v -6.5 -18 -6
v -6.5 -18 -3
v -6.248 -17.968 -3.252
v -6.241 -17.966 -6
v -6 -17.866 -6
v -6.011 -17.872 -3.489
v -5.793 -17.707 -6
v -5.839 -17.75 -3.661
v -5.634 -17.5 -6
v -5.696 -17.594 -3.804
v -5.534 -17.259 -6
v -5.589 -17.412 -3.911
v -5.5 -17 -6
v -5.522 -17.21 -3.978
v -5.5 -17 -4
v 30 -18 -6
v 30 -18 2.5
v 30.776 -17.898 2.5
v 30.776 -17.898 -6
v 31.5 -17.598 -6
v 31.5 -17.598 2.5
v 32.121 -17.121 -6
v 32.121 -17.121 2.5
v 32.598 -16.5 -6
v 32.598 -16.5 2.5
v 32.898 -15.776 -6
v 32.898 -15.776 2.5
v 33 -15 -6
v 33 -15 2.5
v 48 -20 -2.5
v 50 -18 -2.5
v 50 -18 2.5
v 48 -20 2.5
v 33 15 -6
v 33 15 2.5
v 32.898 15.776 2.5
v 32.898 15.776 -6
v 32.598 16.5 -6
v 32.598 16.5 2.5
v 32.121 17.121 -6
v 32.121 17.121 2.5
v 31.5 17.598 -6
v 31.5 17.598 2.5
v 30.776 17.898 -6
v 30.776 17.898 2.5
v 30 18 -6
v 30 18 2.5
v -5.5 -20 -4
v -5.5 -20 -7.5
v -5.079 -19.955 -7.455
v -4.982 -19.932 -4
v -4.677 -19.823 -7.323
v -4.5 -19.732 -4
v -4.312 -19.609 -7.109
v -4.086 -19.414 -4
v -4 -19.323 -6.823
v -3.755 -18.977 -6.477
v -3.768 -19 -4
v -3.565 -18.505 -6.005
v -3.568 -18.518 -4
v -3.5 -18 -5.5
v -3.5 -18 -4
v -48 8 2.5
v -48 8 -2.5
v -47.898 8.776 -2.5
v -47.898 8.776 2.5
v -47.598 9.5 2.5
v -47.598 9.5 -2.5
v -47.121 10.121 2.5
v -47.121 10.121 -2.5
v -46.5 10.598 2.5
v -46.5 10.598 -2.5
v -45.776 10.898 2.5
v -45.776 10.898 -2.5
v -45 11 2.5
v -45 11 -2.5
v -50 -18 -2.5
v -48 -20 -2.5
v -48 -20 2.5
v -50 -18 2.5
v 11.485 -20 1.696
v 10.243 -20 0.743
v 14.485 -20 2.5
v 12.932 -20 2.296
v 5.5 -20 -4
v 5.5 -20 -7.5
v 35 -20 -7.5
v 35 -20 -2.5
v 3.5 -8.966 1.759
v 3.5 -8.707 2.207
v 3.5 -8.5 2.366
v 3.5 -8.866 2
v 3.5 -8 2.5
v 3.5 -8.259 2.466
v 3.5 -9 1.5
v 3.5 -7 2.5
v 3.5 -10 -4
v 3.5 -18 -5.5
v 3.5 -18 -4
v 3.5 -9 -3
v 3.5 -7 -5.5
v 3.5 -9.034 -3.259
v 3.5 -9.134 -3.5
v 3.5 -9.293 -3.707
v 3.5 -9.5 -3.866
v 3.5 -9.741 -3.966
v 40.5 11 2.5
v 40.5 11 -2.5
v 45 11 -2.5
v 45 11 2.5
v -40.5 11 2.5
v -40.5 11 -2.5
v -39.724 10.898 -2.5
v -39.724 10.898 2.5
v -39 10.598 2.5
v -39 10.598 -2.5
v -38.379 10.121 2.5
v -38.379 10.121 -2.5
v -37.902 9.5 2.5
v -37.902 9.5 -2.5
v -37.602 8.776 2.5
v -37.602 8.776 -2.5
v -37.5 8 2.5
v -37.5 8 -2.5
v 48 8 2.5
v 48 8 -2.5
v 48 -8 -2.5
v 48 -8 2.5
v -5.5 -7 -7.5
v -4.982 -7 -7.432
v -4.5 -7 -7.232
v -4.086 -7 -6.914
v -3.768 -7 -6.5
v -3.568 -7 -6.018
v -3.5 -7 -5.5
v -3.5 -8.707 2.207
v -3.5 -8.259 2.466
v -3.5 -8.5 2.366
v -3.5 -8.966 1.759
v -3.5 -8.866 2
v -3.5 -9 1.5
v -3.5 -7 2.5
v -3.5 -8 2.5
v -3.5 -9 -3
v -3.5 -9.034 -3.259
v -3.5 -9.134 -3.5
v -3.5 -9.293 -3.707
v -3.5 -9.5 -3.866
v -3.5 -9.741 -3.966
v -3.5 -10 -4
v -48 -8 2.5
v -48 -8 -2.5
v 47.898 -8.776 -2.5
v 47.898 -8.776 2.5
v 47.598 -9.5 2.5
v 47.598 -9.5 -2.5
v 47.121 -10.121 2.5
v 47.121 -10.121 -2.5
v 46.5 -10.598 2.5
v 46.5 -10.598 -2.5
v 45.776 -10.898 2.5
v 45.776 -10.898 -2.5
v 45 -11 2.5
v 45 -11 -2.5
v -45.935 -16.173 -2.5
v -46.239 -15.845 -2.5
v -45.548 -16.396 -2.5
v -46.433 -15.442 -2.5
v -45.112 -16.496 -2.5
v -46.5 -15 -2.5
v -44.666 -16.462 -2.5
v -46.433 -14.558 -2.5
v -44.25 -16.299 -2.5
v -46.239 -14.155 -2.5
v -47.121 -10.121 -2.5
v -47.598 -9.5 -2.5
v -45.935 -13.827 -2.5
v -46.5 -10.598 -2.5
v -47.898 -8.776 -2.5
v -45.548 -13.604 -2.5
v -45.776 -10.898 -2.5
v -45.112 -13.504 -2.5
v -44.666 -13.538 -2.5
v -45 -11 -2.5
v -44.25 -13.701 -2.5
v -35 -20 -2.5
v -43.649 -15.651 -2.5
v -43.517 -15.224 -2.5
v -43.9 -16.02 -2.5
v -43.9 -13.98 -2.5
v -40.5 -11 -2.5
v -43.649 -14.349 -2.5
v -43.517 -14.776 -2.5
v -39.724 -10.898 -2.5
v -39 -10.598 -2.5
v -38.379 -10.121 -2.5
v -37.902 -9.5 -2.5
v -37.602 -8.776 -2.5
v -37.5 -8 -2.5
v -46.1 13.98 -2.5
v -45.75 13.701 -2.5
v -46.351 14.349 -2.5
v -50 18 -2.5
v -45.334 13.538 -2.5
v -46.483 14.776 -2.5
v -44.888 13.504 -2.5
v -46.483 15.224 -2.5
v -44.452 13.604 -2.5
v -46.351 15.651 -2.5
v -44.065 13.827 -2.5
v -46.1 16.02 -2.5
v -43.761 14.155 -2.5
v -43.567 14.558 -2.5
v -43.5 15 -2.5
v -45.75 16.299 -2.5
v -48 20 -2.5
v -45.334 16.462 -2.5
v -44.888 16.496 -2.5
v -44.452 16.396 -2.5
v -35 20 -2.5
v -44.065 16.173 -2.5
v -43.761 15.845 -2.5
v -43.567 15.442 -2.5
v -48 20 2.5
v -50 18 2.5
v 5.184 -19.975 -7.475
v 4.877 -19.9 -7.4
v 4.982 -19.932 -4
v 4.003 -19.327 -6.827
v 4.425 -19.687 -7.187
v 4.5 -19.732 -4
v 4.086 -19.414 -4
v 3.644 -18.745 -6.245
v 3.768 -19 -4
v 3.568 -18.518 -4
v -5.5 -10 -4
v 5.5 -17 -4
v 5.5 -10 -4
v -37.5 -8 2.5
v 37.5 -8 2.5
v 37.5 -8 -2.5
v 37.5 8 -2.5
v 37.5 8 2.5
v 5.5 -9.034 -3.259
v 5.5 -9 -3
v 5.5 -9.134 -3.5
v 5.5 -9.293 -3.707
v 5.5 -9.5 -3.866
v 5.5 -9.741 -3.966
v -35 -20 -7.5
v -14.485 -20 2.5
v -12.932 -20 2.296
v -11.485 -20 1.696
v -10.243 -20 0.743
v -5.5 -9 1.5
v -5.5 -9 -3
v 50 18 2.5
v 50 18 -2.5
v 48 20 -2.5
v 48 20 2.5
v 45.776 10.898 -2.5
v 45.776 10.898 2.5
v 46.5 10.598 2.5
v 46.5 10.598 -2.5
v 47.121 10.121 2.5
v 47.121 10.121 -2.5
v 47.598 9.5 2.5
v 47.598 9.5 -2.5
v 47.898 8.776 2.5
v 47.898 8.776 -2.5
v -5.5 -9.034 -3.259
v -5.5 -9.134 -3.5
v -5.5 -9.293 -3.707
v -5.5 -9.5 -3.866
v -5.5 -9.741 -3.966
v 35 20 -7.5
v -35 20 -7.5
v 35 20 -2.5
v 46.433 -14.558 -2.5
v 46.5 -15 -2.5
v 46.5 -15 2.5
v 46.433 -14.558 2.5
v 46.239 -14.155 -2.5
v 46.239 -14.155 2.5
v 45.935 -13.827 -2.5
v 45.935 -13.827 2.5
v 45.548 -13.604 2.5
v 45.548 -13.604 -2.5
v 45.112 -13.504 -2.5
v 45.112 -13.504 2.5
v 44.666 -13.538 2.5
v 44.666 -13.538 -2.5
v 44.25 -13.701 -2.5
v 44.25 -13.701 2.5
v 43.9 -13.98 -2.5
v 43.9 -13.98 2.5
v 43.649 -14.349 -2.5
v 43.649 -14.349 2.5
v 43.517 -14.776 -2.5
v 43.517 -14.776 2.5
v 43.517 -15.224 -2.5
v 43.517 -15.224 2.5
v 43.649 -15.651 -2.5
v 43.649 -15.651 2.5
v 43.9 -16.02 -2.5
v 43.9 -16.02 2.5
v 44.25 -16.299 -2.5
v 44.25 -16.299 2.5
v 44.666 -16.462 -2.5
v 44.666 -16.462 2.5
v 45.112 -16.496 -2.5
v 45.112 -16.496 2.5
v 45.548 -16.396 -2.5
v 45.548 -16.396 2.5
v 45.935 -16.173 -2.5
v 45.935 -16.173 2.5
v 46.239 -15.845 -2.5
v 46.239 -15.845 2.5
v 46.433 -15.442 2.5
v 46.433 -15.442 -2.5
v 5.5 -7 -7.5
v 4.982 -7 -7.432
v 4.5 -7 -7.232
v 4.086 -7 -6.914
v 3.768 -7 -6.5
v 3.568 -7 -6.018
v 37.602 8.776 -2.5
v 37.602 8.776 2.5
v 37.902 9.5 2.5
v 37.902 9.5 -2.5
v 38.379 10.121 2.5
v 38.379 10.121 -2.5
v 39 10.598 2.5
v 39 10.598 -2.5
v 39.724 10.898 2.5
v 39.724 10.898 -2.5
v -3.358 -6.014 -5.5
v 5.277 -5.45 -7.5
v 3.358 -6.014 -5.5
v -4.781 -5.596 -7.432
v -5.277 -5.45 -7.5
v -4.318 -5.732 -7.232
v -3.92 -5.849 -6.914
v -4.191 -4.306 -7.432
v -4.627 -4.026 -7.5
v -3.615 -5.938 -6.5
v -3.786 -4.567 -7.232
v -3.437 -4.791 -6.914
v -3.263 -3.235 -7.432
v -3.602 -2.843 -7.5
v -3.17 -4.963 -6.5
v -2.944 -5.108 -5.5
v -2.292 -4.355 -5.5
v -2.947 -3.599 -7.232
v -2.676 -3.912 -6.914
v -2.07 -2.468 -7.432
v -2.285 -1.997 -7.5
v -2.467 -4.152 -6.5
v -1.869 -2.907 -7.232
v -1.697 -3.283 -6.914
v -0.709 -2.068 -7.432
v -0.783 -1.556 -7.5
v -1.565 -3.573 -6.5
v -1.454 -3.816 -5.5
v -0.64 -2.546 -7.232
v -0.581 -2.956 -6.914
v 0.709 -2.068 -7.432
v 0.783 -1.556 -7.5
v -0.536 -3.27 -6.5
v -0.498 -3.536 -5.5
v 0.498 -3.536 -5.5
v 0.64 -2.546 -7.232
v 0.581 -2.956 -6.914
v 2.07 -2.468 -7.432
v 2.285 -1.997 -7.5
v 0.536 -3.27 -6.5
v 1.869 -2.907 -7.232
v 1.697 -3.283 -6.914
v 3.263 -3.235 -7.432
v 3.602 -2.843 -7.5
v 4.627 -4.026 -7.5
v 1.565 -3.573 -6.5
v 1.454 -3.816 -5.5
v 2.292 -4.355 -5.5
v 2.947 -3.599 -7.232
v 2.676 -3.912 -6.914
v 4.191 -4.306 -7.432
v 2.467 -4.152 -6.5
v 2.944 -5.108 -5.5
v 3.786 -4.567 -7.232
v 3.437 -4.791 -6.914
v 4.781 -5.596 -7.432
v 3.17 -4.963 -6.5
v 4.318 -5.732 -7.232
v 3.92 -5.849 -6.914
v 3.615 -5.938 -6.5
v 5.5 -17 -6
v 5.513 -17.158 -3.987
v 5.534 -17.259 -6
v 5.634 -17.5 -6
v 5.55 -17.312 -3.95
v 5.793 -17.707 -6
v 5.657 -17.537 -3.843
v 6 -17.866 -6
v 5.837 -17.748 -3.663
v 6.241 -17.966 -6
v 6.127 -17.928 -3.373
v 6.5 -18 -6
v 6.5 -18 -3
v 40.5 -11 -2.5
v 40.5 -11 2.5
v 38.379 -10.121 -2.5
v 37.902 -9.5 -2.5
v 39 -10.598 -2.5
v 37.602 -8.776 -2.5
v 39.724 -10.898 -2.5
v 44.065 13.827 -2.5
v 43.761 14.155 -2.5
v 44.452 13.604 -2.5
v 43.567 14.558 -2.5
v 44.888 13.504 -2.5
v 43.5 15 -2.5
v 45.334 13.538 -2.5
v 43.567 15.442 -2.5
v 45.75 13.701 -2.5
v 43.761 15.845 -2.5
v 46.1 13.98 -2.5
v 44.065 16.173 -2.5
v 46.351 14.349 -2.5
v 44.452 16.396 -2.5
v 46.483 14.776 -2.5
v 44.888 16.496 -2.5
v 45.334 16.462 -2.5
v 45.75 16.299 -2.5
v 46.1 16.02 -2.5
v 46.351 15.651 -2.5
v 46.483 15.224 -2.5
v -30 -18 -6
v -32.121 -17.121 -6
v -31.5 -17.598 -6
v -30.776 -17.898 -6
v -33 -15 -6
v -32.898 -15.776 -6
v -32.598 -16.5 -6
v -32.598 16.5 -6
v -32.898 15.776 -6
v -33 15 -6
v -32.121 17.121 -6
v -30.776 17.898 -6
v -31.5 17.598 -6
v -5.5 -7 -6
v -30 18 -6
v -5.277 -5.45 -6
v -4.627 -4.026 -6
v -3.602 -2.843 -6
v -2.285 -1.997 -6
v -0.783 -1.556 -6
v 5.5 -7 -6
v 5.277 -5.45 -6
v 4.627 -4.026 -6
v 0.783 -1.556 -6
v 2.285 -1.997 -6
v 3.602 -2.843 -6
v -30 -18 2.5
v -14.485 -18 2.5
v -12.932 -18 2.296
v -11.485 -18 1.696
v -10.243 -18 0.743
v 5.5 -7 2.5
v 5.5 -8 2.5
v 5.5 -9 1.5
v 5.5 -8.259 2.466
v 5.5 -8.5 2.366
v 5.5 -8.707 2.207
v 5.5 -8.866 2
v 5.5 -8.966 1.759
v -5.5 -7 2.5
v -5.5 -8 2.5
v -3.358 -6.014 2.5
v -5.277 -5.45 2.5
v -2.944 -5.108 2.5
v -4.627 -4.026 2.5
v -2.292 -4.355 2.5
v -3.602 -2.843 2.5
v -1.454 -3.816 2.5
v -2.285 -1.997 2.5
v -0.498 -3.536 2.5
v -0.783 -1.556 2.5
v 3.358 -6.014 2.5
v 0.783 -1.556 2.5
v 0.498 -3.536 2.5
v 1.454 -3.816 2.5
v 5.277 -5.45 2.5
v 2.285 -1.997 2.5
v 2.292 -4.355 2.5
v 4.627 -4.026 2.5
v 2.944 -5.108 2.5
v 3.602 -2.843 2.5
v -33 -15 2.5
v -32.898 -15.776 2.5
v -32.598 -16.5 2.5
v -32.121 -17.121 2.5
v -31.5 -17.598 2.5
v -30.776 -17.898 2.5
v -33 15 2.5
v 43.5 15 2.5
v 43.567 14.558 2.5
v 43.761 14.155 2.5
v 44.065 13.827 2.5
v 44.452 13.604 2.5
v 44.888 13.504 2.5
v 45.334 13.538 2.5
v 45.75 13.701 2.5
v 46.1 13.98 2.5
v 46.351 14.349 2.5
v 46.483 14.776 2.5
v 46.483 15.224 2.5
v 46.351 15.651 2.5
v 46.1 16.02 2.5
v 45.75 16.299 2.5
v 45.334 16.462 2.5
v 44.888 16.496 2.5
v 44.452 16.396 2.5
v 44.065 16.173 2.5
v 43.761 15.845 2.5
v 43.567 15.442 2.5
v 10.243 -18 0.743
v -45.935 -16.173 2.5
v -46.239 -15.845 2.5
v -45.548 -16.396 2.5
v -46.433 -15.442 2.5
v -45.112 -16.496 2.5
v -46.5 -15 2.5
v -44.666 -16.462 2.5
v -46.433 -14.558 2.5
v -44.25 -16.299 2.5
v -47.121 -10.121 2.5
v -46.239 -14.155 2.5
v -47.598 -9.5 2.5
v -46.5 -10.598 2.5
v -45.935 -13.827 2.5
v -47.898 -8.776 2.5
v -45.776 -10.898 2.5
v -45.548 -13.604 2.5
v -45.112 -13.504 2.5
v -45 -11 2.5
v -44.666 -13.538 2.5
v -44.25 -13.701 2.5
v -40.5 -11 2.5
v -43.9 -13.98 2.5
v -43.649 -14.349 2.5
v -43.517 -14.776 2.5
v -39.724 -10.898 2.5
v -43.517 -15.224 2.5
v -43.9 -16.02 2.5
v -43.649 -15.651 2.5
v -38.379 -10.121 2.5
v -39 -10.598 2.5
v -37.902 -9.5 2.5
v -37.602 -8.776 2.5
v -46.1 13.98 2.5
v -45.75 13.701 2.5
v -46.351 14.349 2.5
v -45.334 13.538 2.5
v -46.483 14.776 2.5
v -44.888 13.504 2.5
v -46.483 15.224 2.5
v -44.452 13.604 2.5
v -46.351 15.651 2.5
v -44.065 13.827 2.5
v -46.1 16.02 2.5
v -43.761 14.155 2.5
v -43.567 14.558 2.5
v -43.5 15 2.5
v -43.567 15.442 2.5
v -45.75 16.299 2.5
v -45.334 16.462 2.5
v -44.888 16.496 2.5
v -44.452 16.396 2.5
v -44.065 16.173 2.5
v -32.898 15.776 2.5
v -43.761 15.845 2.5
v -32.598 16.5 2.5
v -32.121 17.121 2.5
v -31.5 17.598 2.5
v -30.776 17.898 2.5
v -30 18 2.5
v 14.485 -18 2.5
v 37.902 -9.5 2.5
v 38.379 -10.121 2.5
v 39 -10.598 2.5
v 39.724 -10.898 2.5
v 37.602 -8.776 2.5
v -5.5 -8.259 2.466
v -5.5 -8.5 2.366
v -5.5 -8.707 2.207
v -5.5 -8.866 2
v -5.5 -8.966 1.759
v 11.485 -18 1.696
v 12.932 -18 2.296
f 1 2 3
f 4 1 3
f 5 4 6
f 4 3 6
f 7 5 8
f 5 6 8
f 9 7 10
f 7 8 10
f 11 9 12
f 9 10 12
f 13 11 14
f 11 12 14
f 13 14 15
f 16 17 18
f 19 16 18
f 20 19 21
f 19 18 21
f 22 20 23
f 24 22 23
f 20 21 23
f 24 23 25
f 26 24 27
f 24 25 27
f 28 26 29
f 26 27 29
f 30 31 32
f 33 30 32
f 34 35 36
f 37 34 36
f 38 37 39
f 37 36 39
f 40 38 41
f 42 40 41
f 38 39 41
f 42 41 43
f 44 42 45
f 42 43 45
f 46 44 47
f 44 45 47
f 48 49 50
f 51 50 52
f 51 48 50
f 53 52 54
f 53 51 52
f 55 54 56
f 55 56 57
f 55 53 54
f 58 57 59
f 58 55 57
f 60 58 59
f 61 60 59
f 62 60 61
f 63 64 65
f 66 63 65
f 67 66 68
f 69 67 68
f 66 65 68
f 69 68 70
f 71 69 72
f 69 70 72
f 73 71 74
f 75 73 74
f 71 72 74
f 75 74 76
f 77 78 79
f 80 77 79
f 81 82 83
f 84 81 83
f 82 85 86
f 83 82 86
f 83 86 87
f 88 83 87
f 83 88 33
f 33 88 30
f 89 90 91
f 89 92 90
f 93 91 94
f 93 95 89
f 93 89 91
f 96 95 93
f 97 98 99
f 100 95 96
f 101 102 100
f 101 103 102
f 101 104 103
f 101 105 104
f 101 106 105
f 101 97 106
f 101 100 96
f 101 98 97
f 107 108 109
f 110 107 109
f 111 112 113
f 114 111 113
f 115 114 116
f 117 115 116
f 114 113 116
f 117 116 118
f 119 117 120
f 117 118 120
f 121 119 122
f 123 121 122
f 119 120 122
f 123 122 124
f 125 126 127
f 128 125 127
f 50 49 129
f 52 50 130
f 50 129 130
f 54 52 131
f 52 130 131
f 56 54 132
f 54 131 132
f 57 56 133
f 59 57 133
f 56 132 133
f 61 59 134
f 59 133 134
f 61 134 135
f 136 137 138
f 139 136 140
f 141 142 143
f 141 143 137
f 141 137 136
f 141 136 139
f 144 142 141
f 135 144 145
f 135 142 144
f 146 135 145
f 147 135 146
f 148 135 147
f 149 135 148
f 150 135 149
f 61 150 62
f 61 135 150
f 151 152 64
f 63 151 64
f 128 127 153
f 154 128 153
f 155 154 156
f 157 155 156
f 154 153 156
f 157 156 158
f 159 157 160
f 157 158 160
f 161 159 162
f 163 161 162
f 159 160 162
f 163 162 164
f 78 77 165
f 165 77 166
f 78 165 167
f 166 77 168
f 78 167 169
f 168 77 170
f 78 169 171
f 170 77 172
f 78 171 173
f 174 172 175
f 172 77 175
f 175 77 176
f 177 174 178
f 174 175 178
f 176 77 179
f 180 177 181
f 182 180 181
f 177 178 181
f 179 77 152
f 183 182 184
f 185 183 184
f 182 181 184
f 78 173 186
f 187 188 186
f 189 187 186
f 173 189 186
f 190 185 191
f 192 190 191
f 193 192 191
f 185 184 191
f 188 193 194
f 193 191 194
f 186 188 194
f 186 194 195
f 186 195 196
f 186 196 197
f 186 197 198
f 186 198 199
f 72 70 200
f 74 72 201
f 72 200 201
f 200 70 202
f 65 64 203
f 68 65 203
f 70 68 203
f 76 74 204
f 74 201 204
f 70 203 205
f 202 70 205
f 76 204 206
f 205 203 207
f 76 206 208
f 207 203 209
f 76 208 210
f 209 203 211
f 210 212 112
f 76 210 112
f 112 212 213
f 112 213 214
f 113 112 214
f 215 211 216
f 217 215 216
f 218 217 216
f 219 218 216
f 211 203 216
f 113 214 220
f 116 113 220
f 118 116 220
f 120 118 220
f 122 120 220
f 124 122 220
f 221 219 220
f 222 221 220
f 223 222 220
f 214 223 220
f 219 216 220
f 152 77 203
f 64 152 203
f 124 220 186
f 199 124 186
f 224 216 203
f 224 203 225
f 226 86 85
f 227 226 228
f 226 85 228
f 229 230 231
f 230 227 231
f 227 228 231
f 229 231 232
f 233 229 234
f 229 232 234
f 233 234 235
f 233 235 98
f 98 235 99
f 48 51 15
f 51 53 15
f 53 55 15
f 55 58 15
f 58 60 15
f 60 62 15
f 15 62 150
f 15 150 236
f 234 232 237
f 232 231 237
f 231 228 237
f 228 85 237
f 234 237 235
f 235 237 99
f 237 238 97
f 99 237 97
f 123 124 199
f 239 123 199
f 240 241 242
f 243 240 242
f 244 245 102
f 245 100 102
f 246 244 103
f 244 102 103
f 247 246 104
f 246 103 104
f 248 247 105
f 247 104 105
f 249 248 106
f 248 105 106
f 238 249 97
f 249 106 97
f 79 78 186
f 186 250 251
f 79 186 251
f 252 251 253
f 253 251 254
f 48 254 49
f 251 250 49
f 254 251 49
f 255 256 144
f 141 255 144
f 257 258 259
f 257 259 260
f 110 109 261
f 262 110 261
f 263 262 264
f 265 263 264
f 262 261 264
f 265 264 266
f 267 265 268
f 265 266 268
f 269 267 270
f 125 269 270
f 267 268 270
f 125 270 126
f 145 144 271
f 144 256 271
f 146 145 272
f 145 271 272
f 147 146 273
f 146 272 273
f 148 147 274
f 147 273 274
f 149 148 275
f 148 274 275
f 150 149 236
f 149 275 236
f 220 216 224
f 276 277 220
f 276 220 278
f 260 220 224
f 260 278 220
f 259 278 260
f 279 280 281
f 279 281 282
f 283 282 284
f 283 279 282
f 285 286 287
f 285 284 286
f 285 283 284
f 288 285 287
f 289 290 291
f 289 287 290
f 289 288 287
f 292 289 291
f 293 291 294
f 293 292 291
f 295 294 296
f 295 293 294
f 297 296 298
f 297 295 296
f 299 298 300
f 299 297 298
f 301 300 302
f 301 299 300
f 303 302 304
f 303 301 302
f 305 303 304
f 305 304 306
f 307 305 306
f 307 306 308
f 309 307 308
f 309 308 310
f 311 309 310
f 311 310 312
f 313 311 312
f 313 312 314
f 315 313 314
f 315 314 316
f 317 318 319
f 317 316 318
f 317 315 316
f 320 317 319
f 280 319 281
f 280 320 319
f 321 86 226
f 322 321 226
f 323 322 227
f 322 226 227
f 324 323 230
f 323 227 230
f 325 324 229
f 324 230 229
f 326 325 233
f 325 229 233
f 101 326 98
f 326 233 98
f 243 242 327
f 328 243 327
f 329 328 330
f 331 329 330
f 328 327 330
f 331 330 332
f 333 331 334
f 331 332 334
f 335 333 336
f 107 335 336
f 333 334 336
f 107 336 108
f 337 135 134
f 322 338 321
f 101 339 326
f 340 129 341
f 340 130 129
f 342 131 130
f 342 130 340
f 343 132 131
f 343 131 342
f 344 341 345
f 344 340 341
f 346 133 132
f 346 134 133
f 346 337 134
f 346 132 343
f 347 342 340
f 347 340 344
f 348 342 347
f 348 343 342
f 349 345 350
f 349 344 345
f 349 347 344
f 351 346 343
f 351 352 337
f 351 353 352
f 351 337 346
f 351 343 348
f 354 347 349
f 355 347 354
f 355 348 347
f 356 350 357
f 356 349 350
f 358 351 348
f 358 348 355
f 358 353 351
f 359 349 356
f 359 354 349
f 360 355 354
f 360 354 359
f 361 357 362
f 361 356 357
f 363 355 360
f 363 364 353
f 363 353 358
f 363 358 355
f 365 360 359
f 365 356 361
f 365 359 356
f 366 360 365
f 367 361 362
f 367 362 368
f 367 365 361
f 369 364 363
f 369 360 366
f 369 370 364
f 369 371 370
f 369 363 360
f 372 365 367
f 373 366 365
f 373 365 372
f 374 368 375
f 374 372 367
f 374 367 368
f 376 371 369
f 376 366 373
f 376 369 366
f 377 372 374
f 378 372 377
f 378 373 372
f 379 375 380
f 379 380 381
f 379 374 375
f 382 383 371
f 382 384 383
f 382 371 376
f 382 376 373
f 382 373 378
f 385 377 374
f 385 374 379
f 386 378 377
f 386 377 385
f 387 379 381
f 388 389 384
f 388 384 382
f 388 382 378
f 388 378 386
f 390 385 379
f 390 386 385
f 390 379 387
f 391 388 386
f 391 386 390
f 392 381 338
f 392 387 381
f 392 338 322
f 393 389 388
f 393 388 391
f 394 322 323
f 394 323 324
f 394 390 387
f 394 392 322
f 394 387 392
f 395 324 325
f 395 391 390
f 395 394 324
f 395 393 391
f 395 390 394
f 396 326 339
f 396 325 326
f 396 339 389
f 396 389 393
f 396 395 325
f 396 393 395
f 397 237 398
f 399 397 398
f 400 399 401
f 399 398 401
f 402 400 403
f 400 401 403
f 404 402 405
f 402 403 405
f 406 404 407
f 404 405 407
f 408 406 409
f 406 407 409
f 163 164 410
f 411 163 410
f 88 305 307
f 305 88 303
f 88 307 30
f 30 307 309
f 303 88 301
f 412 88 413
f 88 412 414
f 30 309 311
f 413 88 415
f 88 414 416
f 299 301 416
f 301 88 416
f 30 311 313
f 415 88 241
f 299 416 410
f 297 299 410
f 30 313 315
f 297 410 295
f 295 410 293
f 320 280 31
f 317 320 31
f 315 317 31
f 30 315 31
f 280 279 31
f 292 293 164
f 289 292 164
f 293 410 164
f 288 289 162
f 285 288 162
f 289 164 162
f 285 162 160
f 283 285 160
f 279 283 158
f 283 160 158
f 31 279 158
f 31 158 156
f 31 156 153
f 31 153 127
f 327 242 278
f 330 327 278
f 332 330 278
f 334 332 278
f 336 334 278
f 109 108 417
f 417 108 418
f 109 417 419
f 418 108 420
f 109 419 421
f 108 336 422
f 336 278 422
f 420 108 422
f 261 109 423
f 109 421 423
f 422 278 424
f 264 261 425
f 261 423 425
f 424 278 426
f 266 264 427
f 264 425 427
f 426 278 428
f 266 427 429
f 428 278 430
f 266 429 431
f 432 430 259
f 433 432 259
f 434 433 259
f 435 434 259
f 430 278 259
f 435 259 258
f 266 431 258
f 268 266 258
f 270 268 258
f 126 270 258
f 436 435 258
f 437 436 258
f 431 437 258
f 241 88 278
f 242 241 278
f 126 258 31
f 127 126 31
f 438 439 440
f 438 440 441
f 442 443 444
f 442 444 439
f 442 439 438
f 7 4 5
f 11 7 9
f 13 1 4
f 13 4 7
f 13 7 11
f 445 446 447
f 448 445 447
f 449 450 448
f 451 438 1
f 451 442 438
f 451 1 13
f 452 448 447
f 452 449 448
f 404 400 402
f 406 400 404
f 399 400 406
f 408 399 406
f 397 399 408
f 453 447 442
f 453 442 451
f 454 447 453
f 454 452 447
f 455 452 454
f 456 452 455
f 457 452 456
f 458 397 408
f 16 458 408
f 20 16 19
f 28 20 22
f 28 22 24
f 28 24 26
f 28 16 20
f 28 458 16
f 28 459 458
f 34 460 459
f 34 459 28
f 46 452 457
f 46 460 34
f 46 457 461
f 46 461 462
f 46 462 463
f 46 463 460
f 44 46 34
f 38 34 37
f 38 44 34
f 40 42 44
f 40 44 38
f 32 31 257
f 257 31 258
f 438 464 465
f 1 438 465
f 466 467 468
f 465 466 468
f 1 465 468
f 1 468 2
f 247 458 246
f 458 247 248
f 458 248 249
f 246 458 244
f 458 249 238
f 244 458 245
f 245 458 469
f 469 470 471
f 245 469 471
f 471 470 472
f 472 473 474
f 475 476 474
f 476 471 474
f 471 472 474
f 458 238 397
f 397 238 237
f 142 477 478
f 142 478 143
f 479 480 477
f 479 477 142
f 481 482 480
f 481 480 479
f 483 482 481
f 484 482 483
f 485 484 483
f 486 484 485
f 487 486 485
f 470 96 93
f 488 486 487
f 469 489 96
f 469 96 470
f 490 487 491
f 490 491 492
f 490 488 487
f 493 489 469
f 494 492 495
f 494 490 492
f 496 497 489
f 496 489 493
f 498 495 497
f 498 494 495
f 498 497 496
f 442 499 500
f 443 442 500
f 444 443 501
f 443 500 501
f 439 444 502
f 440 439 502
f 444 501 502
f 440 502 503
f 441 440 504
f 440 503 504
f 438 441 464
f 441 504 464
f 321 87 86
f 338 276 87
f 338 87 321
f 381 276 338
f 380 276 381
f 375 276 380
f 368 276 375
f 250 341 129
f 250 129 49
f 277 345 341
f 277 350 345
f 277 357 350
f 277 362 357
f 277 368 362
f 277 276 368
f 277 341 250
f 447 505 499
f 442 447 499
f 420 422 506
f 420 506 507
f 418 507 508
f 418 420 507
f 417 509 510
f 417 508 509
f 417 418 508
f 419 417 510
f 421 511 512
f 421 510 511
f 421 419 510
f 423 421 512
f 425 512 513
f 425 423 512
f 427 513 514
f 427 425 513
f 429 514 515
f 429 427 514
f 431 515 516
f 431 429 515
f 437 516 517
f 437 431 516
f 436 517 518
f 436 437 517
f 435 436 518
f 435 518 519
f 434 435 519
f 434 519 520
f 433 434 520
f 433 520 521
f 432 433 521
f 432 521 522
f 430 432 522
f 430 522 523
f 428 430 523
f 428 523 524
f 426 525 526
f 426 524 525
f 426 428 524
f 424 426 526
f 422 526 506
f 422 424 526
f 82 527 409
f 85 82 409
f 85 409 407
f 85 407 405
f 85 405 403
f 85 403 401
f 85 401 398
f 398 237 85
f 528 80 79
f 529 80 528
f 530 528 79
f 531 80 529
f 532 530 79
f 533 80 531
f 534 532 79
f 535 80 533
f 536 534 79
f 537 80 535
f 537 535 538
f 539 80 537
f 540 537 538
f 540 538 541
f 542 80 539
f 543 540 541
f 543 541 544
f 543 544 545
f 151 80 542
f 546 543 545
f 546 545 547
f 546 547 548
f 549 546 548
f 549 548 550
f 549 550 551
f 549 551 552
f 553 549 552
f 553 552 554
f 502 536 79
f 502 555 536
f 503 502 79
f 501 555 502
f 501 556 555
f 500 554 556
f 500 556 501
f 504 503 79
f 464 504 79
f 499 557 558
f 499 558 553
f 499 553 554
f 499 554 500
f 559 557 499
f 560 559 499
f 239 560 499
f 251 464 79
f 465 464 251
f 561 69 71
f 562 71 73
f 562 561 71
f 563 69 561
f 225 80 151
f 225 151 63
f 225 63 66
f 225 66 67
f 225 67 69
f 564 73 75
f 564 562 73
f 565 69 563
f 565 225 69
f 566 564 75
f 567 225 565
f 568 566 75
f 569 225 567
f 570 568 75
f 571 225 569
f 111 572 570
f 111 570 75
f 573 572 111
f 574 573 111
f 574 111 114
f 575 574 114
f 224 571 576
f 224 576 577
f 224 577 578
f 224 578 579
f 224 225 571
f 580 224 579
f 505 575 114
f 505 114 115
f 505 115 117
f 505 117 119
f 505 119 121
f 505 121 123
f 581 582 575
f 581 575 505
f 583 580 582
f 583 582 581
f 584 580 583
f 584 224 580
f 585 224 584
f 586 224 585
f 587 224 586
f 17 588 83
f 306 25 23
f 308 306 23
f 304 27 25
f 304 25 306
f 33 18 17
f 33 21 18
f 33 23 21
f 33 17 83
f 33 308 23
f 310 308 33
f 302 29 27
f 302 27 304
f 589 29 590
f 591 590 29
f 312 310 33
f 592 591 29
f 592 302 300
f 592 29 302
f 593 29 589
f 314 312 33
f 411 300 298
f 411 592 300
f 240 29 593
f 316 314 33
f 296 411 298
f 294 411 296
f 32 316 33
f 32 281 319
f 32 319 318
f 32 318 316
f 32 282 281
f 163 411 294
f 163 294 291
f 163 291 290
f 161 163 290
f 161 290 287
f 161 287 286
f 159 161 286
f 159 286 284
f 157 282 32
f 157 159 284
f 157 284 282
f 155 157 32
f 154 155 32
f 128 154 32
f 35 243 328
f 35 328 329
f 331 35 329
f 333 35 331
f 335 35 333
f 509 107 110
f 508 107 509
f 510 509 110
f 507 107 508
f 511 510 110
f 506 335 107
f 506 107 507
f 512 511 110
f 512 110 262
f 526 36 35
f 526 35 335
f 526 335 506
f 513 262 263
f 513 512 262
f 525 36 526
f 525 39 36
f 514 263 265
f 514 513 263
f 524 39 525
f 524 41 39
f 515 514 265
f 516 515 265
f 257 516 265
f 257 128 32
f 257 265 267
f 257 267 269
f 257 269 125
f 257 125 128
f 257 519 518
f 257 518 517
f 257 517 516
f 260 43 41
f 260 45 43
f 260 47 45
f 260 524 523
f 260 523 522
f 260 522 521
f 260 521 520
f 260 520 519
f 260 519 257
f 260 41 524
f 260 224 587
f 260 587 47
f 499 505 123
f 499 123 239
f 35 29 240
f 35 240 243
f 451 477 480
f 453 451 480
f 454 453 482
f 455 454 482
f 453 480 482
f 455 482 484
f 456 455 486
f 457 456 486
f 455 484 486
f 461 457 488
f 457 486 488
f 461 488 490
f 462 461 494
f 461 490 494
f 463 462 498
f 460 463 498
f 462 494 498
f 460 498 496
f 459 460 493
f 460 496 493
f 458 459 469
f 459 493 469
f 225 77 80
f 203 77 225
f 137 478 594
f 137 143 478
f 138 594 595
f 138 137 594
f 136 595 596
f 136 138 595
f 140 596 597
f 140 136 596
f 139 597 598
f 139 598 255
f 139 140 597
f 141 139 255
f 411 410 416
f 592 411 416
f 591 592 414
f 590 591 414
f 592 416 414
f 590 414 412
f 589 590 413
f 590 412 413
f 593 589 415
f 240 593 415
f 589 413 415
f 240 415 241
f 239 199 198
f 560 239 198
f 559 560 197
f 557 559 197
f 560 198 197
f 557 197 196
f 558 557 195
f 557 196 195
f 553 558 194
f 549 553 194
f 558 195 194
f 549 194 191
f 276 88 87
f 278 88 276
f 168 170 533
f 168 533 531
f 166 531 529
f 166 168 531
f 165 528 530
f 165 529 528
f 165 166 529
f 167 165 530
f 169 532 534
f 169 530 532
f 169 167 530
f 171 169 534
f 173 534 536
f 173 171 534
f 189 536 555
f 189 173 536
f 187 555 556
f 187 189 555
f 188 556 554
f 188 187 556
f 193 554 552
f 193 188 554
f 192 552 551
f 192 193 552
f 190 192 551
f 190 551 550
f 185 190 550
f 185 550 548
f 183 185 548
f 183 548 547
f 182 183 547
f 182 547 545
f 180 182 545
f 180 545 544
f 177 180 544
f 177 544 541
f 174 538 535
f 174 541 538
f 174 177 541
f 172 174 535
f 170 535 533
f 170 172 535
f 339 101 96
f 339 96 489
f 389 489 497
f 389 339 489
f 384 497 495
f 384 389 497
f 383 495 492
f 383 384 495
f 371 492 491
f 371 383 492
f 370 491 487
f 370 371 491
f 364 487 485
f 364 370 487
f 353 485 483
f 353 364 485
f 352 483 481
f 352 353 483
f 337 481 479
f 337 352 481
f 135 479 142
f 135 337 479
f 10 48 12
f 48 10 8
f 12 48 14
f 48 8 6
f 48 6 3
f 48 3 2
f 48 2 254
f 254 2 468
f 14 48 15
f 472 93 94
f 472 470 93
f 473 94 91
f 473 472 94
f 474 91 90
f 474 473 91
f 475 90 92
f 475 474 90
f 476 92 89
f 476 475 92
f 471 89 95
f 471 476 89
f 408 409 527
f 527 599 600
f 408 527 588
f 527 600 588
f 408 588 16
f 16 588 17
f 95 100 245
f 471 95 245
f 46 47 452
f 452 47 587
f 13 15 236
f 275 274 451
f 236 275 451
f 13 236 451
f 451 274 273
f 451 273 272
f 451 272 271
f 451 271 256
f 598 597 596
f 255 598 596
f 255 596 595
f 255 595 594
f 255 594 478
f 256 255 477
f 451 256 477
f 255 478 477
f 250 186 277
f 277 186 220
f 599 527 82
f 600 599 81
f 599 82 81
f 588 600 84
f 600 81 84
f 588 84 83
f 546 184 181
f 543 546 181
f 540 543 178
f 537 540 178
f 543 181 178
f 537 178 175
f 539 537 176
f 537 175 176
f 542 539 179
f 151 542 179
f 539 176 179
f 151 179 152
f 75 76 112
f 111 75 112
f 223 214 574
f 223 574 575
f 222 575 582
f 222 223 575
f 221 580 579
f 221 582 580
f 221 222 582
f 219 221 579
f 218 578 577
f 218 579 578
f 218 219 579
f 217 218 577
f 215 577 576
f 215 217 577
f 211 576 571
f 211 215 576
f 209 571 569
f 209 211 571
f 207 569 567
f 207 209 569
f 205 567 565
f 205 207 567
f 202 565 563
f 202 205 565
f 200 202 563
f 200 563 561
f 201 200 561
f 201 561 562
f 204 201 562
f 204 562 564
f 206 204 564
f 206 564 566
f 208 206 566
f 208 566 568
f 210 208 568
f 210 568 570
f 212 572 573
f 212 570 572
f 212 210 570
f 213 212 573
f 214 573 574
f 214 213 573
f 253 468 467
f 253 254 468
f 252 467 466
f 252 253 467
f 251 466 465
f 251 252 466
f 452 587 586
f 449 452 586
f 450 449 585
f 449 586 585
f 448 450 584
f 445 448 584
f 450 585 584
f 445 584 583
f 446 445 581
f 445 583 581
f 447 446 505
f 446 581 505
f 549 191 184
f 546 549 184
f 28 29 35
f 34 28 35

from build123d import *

# Parameters (mm, degrees)
AUFSATZ_LINEAR_AUSTRAGEN1_DEPTH      = 2.5
AUFSATZ_LINEAR_AUSTRAGEN1_DEPTH_BACK = 2.5
SKIZZE1_W                            = 100
SKIZZE1_H                            = 40
SCHNITT_LINEAR_AUSTRAGEN1_DEPTH      = 54.909646632
SCHNITT_LINEAR_AUSTRAGEN1_DEPTH_BACK = 54.909646632
SKIZZE2_R                            = 1.5
SCHNITT_LINEAR_AUSTRAGEN2_DEPTH      = 54.909646632
SCHNITT_LINEAR_AUSTRAGEN2_DEPTH_BACK = 54.909646632
SKIZZE7_W                            = 70
SKIZZE7_H                            = 40
AUFSATZ_LINEAR_AUSTRAGEN3_DEPTH      = 5
FASE1_SIZE                           = 2
SCHNITT_LINEAR_AUSTRAGEN7_DEPTH      = 55.371407927
SCHNITT_LINEAR_AUSTRAGEN7_DEPTH_BACK = 55.371407927
VERRUNDUNG1_R                        = 2
SCHNITT_LINEAR_AUSTRAGEN6_DEPTH      = 8.5
VERRUNDUNG2_R                        = 2
SCHNITT_LINEAR_AUSTRAGEN8_DEPTH      = 59.285933123
VERRUNDUNG3_R                        = 1
VERRUNDUNG4_R                        = 6


with BuildPart() as part:
    # Skizze1 → Aufsatz-Linear austragen1 (new, two sides: drawn at the far end of the back side and taken through both)
    with BuildSketch(Plane.XY.offset(-AUFSATZ_LINEAR_AUSTRAGEN1_DEPTH_BACK)):
        Rectangle(SKIZZE1_W, SKIZZE1_H)
    extrude(amount=AUFSATZ_LINEAR_AUSTRAGEN1_DEPTH + AUFSATZ_LINEAR_AUSTRAGEN1_DEPTH_BACK)

    # Skizze2 → Schnitt-Linear austragen1 (cut, two sides: drawn at the far end of the back side and taken through both)
    with BuildSketch(Plane.XY.offset(-SCHNITT_LINEAR_AUSTRAGEN1_DEPTH_BACK)):
        with Locations((-45, 15)):
            Circle(SKIZZE2_R)
        with Locations(Location((-45, -15, 0), (0, 0, 180))):
            Circle(SKIZZE2_R)
        with Locations((45, -15)):
            Circle(SKIZZE2_R)
        with Locations(Location((45, 15, 0), (0, 0, 180))):
            Circle(SKIZZE2_R)
    extrude(amount=SCHNITT_LINEAR_AUSTRAGEN1_DEPTH + SCHNITT_LINEAR_AUSTRAGEN1_DEPTH_BACK, mode=Mode.SUBTRACT)

    # Skizze4 → Schnitt-Linear austragen2 (cut, two sides: drawn at the far end of the back side and taken through both)
    with BuildSketch(Plane.XY.offset(-SCHNITT_LINEAR_AUSTRAGEN2_DEPTH_BACK)):
        with BuildLine():
            Line((-48, -8), (-48, 8))
            ThreePointArc((-48, 8), (-47.121320344, 10.121320344), (-45, 11))
            Line((-45, 11), (-40.5, 11))
            ThreePointArc((-40.5, 11), (-38.378679656, 10.121320344), (-37.5, 8))
            Line((-37.5, 8), (-37.5, -8))
            ThreePointArc((-37.5, -8), (-38.378679656, -10.121320344), (-40.5, -11))
            Line((-40.5, -11), (-45, -11))
            ThreePointArc((-45, -11), (-47.121320344, -10.121320344), (-48, -8))
        make_face()
        with BuildLine():
            Line((45, -11), (40.5, -11))
            ThreePointArc((40.5, -11), (38.378679656, -10.121320344), (37.5, -8))
            Line((37.5, -8), (37.5, 8))
            ThreePointArc((37.5, 8), (38.378679656, 10.121320344), (40.5, 11))
            Line((40.5, 11), (45, 11))
            ThreePointArc((45, 11), (47.121320344, 10.121320344), (48, 8))
            Line((48, 8), (48, -8))
            ThreePointArc((48, -8), (47.121320344, -10.121320344), (45, -11))
        make_face()
    extrude(amount=SCHNITT_LINEAR_AUSTRAGEN2_DEPTH + SCHNITT_LINEAR_AUSTRAGEN2_DEPTH_BACK, mode=Mode.SUBTRACT)

    # Skizze7 → Aufsatz-Linear austragen3 (add)
    with BuildSketch(Plane(origin=(0, 0, -2.5), x_dir=(-1, 0, 0), z_dir=(0, 0, -1))):
        Rectangle(SKIZZE7_W, SKIZZE7_H)
    extrude(amount=AUFSATZ_LINEAR_AUSTRAGEN3_DEPTH)

    # Fase1
    fase1_edges = [part.edges().sort_by_distance(p)[0] for p in [
        (50, 20, 0),
        (50, -20, 0),
        (-50, -20, 0),
        (-50, 20, 0),
    ]]
    chamfer(fase1_edges, length=FASE1_SIZE)

    # Skizze9 → Schnitt-Linear austragen7 (cut, two sides: drawn at the far end of the back side and taken through both)
    with BuildSketch(Plane.XY.offset(-SCHNITT_LINEAR_AUSTRAGEN7_DEPTH_BACK)):
        with BuildLine():
            Line((-3.5, -20), (3.5, -20))
            Line((3.5, -20), (3.5, -7))
            ThreePointArc((3.5, -7), (0, -3.5), (-3.5, -7))
            Line((-3.5, -7), (-3.5, -20))
        make_face()
    extrude(amount=SCHNITT_LINEAR_AUSTRAGEN7_DEPTH + SCHNITT_LINEAR_AUSTRAGEN7_DEPTH_BACK, mode=Mode.SUBTRACT)

    # Verrundung1
    verrundung1_edges = [part.edges().sort_by_distance(p)[0] for p in [
        (3.5, -20, -2.5),
        (-3.5, -20, -2.5),
    ]]
    fillet(verrundung1_edges, radius=VERRUNDUNG1_R)

    # Skizze8 → Schnitt-Linear austragen6 (cut)
    with BuildSketch(Plane.XY.offset(2.5)):
        with BuildLine():
            Line((6.5, -18), (30, -18))
            ThreePointArc((30, -18), (32.121320344, -17.121320344), (33, -15))
            Line((33, -15), (33, 15))
            ThreePointArc((33, 15), (32.121320344, 17.121320344), (30, 18))
            Line((30, 18), (-30, 18))
            ThreePointArc((-30, 18), (-32.121320344, 17.121320344), (-33, 15))
            Line((-33, 15), (-33, -15))
            ThreePointArc((-33, -15), (-32.121320344, -17.121320344), (-30, -18))
            Line((-30, -18), (-6.5, -18))
            ThreePointArc((-6.5, -18), (-5.792893219, -17.707106781), (-5.5, -17))
            Line((-5.5, -17), (-5.5, -7))
            ThreePointArc((-5.5, -7), (0, -1.5), (5.5, -7))
            Line((5.5, -7), (5.5, -17))
            ThreePointArc((5.5, -17), (5.792893219, -17.707106781), (6.5, -18))
        make_face()
    extrude(amount=-SCHNITT_LINEAR_AUSTRAGEN6_DEPTH, mode=Mode.SUBTRACT)

    # Verrundung2
    # the kernel refuses this fillet: 2 mm, written as the material it takes off along each edge
    with BuildSketch(Plane(origin=(-3.5, -7, -7.5), x_dir=(0, 0, 1), z_dir=(0, -1, 0)), Plane(origin=(3.5, -23, -7.5), x_dir=(0, 0, 1), z_dir=(0, 1, 0))) as verrundung2_piece_1:
        with BuildLine():
            CenterArc((VERRUNDUNG2_R, VERRUNDUNG2_R), VERRUNDUNG2_R, 180, 90)
            Line((0, VERRUNDUNG2_R), (0, 0))
            Line((0, 0), (VERRUNDUNG2_R, 0))
        make_face()
    extrude(amount=16, mode=Mode.SUBTRACT)
    with BuildSketch(Plane(origin=(0, -7, -7.5), x_dir=(-1, 0, 0), z_dir=(0, -1, 0))) as verrundung2_piece_2:
        with BuildLine():
            CenterArc((3.5 + VERRUNDUNG2_R, -VERRUNDUNG2_R), VERRUNDUNG2_R, 90, 90)
            Line((3.5 + VERRUNDUNG2_R, 0), (3.5, 0))
            Line((3.5, 0), (3.5, -VERRUNDUNG2_R))
        make_face()
    revolve(axis=Axis((0, -7, -7.5), (0, 0, -1)), revolution_arc=180, mode=Mode.SUBTRACT)

    # Skizze10 → Schnitt-Linear austragen8 (cut, through all)
    with BuildSketch(Plane(origin=(0, -9, 0), x_dir=(1, 0, 0), z_dir=(0, 1, 0))):
        Polygon((12, -2.5), (5.5, 4), (-5.5, 4), (-12, -2.5), align=None)
    extrude(amount=-SCHNITT_LINEAR_AUSTRAGEN8_DEPTH, mode=Mode.SUBTRACT)

    # Verrundung3
    verrundung3_edges = [part.edges().sort_by_distance(p)[0] for p in [
        (4.5, -9, 2.5),
        (4.5, -9, -4),
        (-4.5, -9, -4),
        (-4.5, -9, 2.5),
    ]]
    fillet(verrundung3_edges, radius=VERRUNDUNG3_R)

    # Verrundung4
    verrundung4_edges = [part.edges().sort_by_distance(p)[0] for p in [
        (12, -19, 2.5),
        (-12, -19, 2.5),
    ]]
    fillet(verrundung4_edges, radius=VERRUNDUNG4_R)


solid = part.part
